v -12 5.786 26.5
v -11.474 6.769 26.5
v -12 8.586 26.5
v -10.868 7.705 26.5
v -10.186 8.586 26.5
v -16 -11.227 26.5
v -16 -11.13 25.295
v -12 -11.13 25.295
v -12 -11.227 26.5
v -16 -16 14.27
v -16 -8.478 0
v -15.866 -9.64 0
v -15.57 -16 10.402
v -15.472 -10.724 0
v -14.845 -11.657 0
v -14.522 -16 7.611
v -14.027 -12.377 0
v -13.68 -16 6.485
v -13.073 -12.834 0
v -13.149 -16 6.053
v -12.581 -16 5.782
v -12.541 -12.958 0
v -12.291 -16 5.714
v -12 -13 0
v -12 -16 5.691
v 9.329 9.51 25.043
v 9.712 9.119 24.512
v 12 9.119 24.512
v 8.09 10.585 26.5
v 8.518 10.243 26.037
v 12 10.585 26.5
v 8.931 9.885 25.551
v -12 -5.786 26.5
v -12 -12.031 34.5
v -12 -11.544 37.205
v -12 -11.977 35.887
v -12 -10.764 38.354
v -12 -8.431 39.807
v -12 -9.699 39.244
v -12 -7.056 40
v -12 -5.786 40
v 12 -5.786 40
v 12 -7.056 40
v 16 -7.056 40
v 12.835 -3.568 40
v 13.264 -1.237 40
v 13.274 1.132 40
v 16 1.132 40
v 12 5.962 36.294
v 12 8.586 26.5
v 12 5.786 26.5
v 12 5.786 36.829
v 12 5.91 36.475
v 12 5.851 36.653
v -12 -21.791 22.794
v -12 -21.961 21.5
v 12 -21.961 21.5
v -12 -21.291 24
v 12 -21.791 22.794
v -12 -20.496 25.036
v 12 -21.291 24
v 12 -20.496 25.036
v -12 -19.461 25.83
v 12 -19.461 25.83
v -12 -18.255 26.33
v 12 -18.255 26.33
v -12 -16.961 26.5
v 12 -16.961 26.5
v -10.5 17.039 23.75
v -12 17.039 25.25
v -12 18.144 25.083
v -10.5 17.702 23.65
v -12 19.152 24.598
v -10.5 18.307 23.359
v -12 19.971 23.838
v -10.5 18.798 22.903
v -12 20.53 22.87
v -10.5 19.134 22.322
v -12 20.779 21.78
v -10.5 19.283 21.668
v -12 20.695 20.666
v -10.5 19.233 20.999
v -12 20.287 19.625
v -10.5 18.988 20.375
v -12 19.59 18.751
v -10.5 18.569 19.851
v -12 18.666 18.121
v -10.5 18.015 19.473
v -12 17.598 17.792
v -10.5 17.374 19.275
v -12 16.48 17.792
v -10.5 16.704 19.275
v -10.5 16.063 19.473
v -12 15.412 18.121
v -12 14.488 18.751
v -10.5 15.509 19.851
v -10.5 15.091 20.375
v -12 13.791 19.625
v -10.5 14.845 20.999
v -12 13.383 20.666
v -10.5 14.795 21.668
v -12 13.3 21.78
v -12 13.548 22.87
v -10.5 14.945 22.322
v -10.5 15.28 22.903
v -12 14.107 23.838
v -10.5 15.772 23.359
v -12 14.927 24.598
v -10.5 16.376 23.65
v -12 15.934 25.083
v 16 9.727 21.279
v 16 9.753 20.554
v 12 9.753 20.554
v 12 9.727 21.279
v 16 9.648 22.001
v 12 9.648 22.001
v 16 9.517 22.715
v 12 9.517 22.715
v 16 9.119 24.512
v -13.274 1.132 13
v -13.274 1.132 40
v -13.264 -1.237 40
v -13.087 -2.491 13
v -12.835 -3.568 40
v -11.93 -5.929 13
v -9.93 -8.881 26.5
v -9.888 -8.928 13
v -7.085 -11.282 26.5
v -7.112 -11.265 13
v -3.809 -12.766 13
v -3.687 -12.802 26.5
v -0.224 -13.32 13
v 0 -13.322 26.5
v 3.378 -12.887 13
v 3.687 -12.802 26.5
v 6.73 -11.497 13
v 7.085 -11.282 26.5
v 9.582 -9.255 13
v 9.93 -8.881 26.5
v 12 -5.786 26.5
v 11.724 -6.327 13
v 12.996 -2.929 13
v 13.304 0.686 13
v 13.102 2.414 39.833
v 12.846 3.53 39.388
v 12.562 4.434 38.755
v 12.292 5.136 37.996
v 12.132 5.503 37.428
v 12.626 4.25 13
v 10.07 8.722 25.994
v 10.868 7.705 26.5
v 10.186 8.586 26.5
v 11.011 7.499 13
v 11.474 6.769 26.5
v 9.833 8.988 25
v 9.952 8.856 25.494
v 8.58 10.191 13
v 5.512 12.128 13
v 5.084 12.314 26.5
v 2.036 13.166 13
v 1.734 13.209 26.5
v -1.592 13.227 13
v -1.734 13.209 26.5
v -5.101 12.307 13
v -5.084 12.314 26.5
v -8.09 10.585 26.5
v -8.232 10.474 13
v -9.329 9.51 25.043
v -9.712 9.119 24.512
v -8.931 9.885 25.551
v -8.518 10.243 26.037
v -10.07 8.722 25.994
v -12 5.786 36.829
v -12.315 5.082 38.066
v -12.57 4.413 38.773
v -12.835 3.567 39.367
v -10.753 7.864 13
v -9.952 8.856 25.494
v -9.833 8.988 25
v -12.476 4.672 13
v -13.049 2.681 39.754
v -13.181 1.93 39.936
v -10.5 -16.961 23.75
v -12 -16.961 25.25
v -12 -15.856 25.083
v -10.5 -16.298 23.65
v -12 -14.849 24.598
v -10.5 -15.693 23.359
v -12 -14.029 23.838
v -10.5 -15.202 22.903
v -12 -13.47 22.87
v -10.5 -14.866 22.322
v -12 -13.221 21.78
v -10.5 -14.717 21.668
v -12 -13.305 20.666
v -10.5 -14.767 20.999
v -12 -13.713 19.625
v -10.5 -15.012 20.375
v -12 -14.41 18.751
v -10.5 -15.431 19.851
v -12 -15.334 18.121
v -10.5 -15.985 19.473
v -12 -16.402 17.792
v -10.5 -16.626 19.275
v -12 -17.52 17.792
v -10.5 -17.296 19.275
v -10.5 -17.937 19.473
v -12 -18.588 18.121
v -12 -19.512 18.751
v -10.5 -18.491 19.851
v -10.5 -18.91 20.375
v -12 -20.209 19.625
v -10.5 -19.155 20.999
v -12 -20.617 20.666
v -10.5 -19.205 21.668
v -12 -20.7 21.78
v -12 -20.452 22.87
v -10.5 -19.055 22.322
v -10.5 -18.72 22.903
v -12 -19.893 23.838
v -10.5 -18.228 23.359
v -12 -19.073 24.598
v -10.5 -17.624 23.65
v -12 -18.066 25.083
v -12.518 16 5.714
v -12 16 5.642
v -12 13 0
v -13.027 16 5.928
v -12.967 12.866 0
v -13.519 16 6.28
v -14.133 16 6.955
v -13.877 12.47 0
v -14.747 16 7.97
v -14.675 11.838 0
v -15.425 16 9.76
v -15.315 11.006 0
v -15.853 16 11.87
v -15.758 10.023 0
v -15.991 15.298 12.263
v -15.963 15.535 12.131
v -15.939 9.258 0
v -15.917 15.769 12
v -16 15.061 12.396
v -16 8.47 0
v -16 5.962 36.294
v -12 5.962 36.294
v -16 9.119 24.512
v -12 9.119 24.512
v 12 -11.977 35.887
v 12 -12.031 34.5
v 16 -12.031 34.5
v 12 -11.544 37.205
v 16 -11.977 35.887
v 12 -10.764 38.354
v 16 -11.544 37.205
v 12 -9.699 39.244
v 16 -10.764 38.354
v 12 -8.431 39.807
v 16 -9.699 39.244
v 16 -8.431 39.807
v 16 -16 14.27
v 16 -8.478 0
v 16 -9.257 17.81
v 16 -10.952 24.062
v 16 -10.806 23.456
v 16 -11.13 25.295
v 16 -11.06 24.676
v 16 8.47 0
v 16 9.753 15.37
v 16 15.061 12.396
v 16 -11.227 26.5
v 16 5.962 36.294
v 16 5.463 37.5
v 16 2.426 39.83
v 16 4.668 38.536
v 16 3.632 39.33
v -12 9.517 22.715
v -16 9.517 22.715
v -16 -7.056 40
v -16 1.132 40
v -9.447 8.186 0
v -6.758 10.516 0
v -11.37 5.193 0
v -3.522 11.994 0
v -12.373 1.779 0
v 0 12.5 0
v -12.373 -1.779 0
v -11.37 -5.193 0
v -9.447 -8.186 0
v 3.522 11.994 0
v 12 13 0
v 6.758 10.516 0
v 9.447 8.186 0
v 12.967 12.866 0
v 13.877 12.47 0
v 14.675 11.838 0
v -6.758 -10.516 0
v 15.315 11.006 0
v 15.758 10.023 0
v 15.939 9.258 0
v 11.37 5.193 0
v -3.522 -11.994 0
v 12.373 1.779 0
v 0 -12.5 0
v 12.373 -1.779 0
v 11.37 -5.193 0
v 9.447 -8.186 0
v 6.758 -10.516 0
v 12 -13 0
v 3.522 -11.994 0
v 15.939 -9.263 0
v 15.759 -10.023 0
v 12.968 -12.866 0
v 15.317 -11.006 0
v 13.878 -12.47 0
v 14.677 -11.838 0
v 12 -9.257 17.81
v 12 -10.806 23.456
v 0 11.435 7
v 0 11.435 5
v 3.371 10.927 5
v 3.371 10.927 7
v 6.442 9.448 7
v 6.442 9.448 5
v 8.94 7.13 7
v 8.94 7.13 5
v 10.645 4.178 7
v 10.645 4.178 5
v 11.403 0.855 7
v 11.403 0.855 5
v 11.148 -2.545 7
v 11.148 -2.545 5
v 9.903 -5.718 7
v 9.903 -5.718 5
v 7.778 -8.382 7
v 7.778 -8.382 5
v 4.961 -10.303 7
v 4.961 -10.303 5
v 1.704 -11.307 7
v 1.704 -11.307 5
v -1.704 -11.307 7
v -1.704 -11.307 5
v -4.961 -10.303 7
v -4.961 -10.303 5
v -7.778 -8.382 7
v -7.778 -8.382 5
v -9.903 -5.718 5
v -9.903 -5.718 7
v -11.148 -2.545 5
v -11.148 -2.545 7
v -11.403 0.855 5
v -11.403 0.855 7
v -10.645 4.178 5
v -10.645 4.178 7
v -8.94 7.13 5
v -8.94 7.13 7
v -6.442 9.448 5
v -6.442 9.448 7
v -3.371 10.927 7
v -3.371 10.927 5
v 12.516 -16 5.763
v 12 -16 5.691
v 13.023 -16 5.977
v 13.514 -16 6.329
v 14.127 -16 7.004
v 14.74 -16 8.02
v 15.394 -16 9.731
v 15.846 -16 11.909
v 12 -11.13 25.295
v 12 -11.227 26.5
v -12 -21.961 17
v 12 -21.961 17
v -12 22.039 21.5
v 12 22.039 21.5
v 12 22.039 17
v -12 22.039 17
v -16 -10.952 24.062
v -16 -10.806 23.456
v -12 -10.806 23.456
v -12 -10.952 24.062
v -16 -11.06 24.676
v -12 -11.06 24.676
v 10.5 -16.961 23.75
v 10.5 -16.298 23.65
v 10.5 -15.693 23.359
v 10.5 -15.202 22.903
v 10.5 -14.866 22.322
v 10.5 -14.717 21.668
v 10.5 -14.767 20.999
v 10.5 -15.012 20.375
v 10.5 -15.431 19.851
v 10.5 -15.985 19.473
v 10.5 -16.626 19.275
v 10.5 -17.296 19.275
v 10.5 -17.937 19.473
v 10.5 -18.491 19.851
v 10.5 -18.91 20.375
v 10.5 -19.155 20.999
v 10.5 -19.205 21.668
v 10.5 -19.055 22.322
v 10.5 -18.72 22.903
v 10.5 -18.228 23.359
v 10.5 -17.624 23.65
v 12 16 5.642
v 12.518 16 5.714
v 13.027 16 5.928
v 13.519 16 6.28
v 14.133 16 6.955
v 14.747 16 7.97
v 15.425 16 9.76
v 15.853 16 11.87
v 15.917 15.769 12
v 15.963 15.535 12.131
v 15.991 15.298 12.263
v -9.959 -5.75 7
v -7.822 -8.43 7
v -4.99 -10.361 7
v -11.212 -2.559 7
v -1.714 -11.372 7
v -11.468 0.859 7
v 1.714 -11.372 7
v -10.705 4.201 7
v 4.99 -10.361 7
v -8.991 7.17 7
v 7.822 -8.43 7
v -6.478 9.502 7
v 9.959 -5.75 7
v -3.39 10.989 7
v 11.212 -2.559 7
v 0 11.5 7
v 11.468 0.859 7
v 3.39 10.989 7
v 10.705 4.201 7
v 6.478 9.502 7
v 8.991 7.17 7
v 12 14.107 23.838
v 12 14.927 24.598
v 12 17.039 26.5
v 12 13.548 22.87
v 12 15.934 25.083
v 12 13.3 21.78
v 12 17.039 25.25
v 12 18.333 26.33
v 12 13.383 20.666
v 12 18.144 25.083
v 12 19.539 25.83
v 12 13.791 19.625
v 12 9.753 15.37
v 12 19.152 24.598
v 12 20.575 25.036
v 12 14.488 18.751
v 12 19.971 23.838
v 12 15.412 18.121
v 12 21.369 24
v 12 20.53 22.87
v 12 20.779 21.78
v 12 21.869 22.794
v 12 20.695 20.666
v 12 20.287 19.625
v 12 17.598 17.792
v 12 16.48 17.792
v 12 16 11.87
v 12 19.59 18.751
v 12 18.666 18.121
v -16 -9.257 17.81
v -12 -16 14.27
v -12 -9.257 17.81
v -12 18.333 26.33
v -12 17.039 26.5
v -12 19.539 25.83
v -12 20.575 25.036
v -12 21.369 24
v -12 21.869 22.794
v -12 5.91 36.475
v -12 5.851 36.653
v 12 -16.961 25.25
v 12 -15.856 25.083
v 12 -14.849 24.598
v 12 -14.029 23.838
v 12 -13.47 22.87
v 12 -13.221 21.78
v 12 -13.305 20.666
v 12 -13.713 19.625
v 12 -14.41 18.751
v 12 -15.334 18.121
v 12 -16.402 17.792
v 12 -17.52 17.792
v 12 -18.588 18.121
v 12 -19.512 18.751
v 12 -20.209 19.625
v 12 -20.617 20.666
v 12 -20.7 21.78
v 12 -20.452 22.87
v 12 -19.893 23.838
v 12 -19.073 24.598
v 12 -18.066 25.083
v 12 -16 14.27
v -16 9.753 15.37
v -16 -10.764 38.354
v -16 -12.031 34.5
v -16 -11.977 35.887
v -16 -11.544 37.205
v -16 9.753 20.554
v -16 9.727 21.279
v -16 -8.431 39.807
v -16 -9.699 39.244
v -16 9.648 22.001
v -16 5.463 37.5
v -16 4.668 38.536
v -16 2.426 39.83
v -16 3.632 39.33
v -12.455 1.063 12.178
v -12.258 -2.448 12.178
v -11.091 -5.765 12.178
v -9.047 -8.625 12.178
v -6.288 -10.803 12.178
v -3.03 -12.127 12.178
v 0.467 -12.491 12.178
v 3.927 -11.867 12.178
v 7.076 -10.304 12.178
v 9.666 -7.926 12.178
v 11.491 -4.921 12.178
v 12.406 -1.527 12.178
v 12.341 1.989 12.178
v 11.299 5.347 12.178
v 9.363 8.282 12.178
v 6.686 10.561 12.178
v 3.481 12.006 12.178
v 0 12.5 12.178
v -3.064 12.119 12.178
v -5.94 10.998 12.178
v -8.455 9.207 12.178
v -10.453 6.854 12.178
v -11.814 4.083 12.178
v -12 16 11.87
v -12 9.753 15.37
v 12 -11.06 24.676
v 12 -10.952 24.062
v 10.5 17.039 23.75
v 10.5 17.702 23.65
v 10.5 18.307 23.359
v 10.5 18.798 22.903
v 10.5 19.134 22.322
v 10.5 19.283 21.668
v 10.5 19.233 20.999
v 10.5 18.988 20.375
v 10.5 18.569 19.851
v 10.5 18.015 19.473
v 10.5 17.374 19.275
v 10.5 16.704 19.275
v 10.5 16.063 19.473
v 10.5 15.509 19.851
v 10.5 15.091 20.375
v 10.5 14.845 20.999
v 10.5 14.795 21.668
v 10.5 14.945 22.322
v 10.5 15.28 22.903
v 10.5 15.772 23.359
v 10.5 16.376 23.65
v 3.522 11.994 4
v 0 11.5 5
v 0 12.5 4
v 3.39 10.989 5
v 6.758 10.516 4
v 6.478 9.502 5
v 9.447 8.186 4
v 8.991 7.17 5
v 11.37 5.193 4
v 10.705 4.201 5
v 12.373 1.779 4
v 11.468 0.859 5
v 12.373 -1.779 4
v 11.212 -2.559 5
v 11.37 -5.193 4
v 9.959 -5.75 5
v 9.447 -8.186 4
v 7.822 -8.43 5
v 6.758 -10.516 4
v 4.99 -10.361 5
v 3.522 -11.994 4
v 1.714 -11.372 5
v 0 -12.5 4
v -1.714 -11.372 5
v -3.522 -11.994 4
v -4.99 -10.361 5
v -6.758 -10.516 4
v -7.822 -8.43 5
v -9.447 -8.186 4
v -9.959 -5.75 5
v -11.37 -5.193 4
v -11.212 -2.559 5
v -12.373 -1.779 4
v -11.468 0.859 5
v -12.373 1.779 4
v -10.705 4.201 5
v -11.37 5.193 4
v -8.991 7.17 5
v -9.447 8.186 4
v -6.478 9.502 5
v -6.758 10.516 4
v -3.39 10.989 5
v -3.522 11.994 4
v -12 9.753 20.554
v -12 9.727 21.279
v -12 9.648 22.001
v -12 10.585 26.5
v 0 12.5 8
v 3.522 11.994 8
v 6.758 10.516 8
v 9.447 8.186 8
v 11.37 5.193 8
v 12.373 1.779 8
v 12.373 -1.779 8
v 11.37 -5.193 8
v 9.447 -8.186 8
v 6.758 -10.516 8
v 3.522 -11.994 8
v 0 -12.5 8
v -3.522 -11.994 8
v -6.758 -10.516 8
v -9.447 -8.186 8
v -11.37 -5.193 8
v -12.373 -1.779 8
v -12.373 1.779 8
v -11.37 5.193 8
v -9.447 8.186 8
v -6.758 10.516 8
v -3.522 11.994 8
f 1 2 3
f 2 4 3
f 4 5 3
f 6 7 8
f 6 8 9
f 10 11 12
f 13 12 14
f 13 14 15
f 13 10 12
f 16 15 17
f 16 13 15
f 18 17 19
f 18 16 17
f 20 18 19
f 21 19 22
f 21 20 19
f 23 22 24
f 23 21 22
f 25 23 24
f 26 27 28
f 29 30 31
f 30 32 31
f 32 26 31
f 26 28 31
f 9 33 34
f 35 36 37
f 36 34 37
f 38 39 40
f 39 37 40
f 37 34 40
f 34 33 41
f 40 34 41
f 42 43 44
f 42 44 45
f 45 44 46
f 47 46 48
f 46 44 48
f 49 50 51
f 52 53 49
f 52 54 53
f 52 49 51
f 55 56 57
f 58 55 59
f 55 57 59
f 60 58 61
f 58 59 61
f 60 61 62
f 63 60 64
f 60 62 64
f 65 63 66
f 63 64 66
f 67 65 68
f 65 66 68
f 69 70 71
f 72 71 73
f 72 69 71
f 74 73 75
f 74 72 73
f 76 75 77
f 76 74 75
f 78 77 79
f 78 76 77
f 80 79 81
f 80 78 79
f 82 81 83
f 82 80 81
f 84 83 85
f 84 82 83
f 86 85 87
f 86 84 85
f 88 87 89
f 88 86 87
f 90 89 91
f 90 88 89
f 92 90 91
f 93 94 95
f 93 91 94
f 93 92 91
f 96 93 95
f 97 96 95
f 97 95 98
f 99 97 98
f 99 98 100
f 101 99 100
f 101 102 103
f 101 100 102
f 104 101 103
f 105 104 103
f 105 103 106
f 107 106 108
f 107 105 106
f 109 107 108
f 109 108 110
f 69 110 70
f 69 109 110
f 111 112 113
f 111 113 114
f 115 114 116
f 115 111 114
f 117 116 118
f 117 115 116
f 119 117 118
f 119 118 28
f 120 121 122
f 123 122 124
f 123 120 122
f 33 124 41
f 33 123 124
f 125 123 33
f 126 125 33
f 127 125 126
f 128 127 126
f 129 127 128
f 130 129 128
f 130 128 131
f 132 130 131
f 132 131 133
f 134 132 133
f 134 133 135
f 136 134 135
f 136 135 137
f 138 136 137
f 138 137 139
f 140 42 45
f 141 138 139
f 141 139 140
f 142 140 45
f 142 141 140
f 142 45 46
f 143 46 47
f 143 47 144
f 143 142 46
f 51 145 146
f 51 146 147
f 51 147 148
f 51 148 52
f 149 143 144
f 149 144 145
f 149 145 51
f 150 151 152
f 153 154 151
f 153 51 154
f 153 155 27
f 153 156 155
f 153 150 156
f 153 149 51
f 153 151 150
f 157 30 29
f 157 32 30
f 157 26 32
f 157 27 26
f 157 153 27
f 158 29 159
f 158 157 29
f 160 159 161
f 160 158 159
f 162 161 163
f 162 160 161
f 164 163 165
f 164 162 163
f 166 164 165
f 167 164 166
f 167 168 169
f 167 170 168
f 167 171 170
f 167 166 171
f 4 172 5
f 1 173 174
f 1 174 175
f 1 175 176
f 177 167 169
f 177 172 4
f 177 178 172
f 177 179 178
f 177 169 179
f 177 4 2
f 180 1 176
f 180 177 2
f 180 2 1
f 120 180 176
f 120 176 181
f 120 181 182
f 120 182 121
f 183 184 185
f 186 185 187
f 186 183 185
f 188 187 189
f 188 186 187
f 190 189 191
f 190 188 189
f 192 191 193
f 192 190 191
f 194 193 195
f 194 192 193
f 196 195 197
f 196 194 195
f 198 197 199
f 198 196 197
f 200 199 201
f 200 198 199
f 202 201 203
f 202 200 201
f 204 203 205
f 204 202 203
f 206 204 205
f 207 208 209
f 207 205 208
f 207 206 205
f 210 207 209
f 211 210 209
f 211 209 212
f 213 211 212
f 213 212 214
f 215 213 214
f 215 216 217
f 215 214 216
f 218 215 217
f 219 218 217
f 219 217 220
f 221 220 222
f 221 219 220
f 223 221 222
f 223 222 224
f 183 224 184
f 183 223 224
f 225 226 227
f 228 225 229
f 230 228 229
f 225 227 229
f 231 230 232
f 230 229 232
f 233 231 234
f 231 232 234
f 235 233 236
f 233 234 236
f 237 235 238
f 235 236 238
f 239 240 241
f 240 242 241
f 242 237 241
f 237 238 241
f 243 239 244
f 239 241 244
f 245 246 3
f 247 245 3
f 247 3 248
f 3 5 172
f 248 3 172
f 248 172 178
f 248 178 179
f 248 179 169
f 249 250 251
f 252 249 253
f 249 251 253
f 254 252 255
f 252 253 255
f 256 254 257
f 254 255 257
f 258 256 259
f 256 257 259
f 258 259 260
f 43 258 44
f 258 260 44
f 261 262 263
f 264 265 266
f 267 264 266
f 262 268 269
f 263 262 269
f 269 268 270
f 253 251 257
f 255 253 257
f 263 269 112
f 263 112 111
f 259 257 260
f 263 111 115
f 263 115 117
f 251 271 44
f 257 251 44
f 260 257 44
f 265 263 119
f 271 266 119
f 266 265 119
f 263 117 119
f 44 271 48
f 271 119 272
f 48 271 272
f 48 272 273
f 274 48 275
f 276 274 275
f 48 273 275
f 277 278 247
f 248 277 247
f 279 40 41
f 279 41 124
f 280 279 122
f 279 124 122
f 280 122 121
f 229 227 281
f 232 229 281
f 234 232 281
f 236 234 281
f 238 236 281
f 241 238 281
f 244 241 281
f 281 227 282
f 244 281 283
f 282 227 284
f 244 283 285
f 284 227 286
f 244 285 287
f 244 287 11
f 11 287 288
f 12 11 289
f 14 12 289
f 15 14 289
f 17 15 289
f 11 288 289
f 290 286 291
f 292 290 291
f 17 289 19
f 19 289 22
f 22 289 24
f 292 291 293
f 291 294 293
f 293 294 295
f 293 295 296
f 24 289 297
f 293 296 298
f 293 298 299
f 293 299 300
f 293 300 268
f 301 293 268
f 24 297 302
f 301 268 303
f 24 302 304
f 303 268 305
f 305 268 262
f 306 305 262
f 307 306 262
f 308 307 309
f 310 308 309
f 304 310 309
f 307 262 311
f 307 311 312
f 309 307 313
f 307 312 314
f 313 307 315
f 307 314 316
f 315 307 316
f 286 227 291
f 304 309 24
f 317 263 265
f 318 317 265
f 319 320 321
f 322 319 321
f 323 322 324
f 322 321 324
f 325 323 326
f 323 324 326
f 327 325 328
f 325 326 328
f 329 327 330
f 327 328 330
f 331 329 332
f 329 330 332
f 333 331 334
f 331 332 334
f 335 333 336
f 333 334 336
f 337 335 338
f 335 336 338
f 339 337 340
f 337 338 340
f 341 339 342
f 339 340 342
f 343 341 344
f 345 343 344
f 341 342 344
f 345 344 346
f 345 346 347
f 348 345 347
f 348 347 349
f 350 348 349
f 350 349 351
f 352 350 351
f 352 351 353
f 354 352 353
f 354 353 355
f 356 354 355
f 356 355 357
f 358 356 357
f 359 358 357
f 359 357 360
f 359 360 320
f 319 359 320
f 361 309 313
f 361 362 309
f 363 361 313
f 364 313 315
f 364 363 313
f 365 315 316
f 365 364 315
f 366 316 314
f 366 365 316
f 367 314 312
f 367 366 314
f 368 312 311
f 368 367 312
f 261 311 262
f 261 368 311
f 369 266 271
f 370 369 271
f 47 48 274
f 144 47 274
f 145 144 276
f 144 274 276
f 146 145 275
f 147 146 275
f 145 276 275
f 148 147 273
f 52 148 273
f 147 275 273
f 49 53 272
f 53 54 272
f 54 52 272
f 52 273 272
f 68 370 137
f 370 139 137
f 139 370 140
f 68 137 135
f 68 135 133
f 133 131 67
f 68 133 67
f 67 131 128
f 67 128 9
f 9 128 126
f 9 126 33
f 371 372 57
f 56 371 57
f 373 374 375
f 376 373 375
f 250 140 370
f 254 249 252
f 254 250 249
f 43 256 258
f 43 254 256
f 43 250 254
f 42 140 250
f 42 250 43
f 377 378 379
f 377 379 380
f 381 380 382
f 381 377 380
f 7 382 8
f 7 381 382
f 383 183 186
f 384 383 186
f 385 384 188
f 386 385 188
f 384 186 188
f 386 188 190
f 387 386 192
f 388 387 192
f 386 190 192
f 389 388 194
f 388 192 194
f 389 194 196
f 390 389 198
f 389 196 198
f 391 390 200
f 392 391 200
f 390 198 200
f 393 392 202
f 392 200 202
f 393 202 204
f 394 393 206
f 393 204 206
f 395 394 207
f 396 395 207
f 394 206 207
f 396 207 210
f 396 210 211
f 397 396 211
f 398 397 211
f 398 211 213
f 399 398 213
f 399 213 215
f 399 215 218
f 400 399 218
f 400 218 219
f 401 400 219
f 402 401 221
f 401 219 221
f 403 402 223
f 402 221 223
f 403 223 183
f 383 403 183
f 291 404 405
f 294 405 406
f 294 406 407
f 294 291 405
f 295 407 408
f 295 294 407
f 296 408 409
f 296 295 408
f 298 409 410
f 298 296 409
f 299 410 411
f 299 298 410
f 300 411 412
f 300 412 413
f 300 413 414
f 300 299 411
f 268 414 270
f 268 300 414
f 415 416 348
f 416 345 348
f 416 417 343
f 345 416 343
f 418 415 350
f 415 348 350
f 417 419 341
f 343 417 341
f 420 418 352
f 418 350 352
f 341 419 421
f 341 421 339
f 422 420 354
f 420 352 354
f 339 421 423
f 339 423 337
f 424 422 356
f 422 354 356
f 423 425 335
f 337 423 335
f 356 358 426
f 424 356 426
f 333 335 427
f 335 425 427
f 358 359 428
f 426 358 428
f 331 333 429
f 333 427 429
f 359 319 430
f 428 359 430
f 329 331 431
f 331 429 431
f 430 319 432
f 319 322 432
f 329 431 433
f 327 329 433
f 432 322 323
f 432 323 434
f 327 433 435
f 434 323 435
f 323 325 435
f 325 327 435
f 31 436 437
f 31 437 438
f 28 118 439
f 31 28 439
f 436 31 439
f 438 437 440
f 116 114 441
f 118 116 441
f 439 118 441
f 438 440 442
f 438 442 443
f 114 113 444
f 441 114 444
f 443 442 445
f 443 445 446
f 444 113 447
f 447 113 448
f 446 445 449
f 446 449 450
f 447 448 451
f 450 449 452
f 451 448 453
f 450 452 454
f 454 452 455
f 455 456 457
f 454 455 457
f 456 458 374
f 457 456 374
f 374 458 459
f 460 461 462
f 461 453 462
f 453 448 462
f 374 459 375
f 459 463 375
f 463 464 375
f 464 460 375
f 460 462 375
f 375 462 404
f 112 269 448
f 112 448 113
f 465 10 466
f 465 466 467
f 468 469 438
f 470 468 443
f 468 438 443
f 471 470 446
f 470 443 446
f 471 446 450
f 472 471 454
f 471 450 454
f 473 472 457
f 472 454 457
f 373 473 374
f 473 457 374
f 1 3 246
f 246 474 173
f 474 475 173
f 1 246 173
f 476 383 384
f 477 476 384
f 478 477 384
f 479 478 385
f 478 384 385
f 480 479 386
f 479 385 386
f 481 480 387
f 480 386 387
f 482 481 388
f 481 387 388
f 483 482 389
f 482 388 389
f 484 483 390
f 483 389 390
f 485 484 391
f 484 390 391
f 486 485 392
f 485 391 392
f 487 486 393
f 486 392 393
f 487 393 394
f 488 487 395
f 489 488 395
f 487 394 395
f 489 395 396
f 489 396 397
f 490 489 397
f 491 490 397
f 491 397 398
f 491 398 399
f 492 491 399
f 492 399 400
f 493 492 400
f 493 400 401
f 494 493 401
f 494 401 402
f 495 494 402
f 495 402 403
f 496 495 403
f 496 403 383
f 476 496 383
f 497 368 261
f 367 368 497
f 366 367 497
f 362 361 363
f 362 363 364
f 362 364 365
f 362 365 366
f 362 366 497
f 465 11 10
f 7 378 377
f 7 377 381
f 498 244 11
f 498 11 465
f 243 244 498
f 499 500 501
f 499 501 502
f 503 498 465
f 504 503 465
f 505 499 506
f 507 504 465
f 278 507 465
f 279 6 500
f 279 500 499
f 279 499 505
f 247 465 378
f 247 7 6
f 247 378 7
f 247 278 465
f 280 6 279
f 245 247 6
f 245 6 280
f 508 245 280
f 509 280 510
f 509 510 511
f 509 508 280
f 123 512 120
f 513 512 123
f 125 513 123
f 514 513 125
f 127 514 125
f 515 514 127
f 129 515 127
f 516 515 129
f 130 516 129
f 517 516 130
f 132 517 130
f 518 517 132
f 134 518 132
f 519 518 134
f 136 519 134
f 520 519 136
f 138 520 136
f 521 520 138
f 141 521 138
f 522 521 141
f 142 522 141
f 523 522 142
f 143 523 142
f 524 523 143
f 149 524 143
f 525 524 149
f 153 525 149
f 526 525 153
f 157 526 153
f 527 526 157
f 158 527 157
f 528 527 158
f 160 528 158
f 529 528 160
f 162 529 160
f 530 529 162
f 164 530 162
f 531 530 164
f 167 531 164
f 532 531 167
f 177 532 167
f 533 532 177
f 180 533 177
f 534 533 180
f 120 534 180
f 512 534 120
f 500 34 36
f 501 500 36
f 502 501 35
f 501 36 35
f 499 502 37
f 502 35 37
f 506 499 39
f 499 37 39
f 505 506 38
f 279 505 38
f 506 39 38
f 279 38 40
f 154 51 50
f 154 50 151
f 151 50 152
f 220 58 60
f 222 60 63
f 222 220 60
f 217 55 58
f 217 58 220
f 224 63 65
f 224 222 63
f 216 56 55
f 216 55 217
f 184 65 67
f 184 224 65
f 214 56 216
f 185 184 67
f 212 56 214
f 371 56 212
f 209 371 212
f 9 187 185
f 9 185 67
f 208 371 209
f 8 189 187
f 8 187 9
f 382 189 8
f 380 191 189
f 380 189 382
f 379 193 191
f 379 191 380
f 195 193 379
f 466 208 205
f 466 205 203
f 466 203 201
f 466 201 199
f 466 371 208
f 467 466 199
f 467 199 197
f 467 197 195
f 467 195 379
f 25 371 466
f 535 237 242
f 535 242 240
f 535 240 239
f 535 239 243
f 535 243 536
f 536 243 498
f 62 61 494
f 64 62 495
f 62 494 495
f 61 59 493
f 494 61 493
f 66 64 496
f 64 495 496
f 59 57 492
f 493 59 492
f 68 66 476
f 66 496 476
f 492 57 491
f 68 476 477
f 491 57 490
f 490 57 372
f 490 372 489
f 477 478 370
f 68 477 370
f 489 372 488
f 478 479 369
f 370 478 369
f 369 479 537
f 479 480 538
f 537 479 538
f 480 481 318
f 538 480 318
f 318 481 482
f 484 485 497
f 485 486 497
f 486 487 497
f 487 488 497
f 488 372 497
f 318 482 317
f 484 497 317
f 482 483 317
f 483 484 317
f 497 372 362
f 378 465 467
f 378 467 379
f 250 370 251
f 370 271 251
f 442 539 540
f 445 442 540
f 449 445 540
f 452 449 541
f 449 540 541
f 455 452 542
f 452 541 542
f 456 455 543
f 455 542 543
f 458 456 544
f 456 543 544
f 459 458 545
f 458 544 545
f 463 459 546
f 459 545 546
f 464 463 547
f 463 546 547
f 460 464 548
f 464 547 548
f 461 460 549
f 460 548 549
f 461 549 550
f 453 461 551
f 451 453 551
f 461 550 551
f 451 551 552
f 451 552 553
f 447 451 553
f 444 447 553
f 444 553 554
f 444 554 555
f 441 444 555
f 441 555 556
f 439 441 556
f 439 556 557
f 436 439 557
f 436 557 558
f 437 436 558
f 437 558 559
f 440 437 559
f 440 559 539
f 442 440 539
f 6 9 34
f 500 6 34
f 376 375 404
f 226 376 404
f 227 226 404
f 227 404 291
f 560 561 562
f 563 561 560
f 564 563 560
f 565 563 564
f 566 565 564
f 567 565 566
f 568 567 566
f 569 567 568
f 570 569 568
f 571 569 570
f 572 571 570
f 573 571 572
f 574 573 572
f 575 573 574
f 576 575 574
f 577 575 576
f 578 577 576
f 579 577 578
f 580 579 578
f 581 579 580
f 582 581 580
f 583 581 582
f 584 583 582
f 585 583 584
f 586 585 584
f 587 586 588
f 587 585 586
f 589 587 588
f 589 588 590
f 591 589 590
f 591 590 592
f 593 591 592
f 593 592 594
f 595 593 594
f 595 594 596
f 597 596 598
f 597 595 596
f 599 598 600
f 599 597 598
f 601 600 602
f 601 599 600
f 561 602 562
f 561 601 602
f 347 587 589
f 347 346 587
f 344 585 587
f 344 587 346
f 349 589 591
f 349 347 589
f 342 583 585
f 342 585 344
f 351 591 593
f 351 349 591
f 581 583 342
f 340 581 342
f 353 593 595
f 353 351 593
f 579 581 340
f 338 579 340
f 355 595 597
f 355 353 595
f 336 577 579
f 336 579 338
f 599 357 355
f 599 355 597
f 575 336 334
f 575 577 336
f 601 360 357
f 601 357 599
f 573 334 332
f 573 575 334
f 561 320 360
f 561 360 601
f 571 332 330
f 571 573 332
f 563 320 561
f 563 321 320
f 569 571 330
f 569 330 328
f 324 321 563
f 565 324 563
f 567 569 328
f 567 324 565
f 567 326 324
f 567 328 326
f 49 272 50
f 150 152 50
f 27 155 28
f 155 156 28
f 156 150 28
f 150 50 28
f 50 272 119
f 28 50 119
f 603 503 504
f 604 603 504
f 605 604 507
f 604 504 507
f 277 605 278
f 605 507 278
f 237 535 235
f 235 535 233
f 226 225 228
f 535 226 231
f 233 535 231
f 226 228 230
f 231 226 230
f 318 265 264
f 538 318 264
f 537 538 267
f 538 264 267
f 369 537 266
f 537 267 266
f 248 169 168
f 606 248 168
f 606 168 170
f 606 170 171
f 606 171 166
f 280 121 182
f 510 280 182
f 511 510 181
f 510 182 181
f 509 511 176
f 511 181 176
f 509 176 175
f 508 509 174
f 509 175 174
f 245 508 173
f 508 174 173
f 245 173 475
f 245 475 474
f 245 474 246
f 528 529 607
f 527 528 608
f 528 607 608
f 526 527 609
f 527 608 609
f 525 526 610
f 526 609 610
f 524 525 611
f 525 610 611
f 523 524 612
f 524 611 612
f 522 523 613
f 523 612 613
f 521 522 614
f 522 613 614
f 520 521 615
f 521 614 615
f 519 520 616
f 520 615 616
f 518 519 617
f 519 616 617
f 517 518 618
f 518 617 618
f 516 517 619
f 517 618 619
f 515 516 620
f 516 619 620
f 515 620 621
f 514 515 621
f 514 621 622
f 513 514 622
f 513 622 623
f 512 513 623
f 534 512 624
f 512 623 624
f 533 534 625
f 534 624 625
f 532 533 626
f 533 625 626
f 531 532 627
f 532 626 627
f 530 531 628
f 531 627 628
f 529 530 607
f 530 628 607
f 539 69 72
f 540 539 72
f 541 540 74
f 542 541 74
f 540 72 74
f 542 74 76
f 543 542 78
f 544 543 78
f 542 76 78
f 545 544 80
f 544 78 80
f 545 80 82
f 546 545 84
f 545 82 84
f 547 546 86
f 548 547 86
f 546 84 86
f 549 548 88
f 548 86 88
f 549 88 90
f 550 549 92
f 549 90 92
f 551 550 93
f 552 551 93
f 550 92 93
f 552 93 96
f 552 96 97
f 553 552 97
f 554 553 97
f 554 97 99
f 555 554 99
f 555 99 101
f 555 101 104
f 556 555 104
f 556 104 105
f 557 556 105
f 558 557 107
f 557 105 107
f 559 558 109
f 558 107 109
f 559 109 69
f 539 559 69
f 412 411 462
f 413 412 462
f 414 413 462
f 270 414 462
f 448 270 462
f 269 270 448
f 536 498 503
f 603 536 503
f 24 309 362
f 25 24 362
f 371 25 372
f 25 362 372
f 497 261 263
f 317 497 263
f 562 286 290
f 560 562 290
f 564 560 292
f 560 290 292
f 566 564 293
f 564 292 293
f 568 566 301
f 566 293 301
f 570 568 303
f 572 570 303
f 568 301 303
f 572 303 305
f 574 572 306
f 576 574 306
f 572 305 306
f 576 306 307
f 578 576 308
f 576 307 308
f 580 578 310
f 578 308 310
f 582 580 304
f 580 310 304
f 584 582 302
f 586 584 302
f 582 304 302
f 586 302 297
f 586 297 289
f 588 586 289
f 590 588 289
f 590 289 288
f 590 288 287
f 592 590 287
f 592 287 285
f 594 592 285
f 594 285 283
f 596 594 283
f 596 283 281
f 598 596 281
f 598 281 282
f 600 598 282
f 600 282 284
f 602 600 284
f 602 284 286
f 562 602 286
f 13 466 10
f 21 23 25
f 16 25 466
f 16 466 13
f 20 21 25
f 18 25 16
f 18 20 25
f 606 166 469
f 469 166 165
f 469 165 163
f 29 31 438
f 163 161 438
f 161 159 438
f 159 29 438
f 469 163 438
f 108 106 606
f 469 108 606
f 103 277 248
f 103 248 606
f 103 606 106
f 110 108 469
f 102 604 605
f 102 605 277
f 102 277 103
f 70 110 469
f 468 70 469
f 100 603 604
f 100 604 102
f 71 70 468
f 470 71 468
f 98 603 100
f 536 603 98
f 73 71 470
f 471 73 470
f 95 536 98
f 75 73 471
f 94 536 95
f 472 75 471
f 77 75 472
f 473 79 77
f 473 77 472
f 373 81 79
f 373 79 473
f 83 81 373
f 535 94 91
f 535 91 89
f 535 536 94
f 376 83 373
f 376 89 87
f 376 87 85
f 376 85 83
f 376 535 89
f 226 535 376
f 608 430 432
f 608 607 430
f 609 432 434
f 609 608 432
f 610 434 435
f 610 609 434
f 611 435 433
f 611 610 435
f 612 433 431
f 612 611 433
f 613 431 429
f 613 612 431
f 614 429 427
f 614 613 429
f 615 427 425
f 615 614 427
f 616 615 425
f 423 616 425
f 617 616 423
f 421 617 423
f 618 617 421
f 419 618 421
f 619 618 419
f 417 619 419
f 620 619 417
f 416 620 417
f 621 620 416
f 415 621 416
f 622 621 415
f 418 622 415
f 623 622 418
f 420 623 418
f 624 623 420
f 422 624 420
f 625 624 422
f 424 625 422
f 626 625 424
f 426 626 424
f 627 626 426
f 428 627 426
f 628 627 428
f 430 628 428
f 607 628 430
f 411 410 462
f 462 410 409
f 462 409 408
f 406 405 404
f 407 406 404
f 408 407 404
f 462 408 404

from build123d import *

# Parameters (mm, degrees)
BOSS_EXTRUDE1_DEPTH           = 16
SKETCH2_W                     = 4
SKETCH2_H                     = 6.039060338
CUT_EXTRUDE1_DEPTH            = 49.391321349
FILLET1_R                     = 4
CUT_EXTRUDE2_DEPTH            = 4
SKETCH4_R                     = 12.5
CUT_EXTRUDE3_DEPTH            = 5
SKETCH5_R                     = 11.435
CUT_EXTRUDE4_DEPTH            = 45.34771704
CUT_EXTRUDE5_START            = -2
SKETCH7_R                     = 12.5
CUT_EXTRUDE5_DEPTH            = 43.347717155
CUT_EXTRUDE6_START            = 5
SKETCH8_R                     = 13.322
CUT_EXTRUDE6_DEPTH            = 38.786914196
CHAMFER5_SIZE                 = 1
SKETCH9_W                     = 24
SKETCH9_H                     = 20
CUT_EXTRUDE7_DEPTH            = 59.111966759
CSK_FOR_M4_SFHCS1_D           = 4.5
CSK_FOR_M4_SFHCS1_CSINK_D     = 7.5
CSK_FOR_M4_SFHCS1_CSINK_ANGLE = 90


with BuildPart() as part:
    # Sketch1 → Boss-Extrude1 (new, symmetric)
    with BuildSketch(Plane(origin=(0, 0, 0), x_dir=(0, 0, -1), z_dir=(1, 0, 0))):
        with BuildLine():
            Line((0, 13), (0, -13))
            Line((0, -13), (-17, -21.960950792))
            Line((-17, -21.960950792), (-21.5, -21.960950792))
            ThreePointArc((-21.5, -21.960950792), (-25.035533906, -20.496484698), (-26.5, -16.960950792))
            Line((-26.5, -16.960950792), (-26.5, -11.227190102))
            Line((-26.5, -11.227190102), (-34.5, -12.031216319))
            ThreePointArc((-34.5, -12.031216319), (-38.354100408, -10.76437729), (-39.999997516, -7.056278884))
            Line((-39.999997516, -7.056278884), (-39.999997516, 1.132402994))
            ThreePointArc((-39.999997516, 1.132402994), (-38.966764217, 4.176210139), (-36.294092741, 5.962032125))
            Line((-36.294092741, 5.962032125), (-24.512466398, 9.118909389))
            Line((-24.512466398, 9.118909389), (-26.5, 10.584515032))
            Line((-26.5, 10.584515032), (-26.5, 17.039060338))
            ThreePointArc((-26.5, 17.039060338), (-25.035533906, 20.574594244), (-21.5, 22.039060338))
            Line((-21.5, 22.039060338), (-17, 22.039060338))
            Line((-17, 22.039060338), (0, 13))
        make_face()
    extrude(amount=BOSS_EXTRUDE1_DEPTH, both=True)

    # Sketch2 → Cut-Extrude1 (cut, through all)
    with BuildSketch(Plane(origin=(0, 0, 0), x_dir=(-1, 0, 0), z_dir=(0, 0, -1))):
        with Locations((-14, 19.019530169)):
            Rectangle(SKETCH2_W, SKETCH2_H)
        with Locations((14, 19.019530169)):
            Rectangle(SKETCH2_W, SKETCH2_H)
        with Locations((14, -19.019530169)):
            Rectangle(SKETCH2_W, SKETCH2_H)
        with Locations((-14, -19.019530169)):
            Rectangle(SKETCH2_W, SKETCH2_H)
    extrude(amount=-CUT_EXTRUDE1_DEPTH, mode=Mode.SUBTRACT)

    # Fillet1
    fillet1_edges = [part.edges().sort_by_distance(p)[0] for p in [
        (16, -14.5, 2.845680173),
        (-16, -14.5, 2.845680173),
        (16, 14.5, 2.821089698),
        (-16, 14.5, 2.821089698),
    ]]
    fillet(fillet1_edges, radius=FILLET1_R)

    # Sketch3 → Cut-Extrude2 (cut)
    with BuildSketch(Plane.ZY.offset(16)):
        with BuildLine():
            Line((14.269532395, -16), (17.810147733, -9.256580566))
            Line((17.810147733, -9.256580566), (23.455857772, -10.805790893))
            ThreePointArc((23.455857772, -10.805790893), (24.367969512, -11.010765142), (25.295236814, -11.12966687))
            Line((25.295236814, -11.12966687), (26.5, -11.227190102))
            Line((26.5, -11.227190102), (26.5, -16))
            Line((26.5, -16), (14.269532395, -16))
        make_face()
        with BuildLine():
            Line((11.870259532, 16), (15.370259532, 9.753066737))
            Line((15.370259532, 9.753066737), (20.553734624, 9.753066737))
            ThreePointArc((20.553734624, 9.753066737), (21.64061559, 9.693825703), (22.714618956, 9.516804502))
            Line((22.714618956, 9.516804502), (24.512466398, 9.118909389))
            Line((24.512466398, 9.118909389), (26.5, 10.584515032))
            Line((26.5, 10.584515032), (26.5, 16))
            Line((26.5, 16), (11.870259532, 16))
        make_face()
    cut_extrude2 = extrude(amount=-CUT_EXTRUDE2_DEPTH, mode=Mode.SUBTRACT)

    # Mirror1: Cut-Extrude2 across plane
    add(cut_extrude2.mirror(Plane(origin=(0, 0, 0), x_dir=(0, 0, 1), z_dir=(1, 0, 0))), mode=Mode.SUBTRACT)

    # Sketch4 → Cut-Extrude3 (cut)
    with BuildSketch(Plane(origin=(0, 0, 0), x_dir=(-1, 0, 0), z_dir=(0, 0, -1))):
        with Locations(Location((0, 0, 0), (0, 0, 90))):
            Circle(SKETCH4_R)
    extrude(amount=-CUT_EXTRUDE3_DEPTH, mode=Mode.SUBTRACT)

    # Sketch5 → Cut-Extrude4 (cut, through all)
    with BuildSketch(Plane(origin=(0, 0, 5), x_dir=(-1, 0, 0), z_dir=(0, 0, -1))):
        with Locations(Location((0, 0, 0), (0, 0, 90))):
            Circle(SKETCH5_R)
    extrude(amount=-CUT_EXTRUDE4_DEPTH, mode=Mode.SUBTRACT)

    # Sketch7 → Cut-Extrude5 (cut, through all)
    with BuildSketch(Plane(origin=(0, 0, 5), x_dir=(-1, 0, 0), z_dir=(0, 0, -1)).offset(CUT_EXTRUDE5_START)):
        with Locations(Location((0, 0, 0), (0, 0, 90))):
            Circle(SKETCH7_R)
    extrude(amount=-CUT_EXTRUDE5_DEPTH, mode=Mode.SUBTRACT)

    # Sketch8 → Cut-Extrude6 (cut, through all)
    with BuildSketch(Plane.XY.offset(7).offset(CUT_EXTRUDE6_START)):
        with Locations(Location((0, 0, 0), (0, 0, 175.123832714))):
            Circle(SKETCH8_R)
    extrude(amount=CUT_EXTRUDE6_DEPTH, mode=Mode.SUBTRACT)

    # Chamfer5
    # the kernel refuses this chamfer: 1 mm, written as the material it adds along each edge
    with BuildSketch(Plane(origin=(0, 0, 7), x_dir=(0, 1, 0), z_dir=(-1, 0, 0))) as chamfer5_piece_1:
        Polygon((12.5 - CHAMFER5_SIZE, 0), (12.5, -CHAMFER5_SIZE), (12.5, 0), align=None)
    revolve(axis=Axis((0, 0, 7), (0, 0, -1)))
    with BuildSketch(Plane(origin=(0, 0, 5), x_dir=(0, 1, 0), z_dir=(-1, 0, 0))) as chamfer5_piece_2:
        Polygon((12.5, CHAMFER5_SIZE), (12.5 - CHAMFER5_SIZE, 0), (12.5, 0), align=None)
    revolve(axis=Axis((0, 0, 5), (0, 0, -1)))
    with BuildSketch(Plane(origin=(0, 0, 12), x_dir=(-0.9963807399610061, 0.08500247663896625, 0), z_dir=(0.08500247663896625, 0.9963807399610061, 0))) as chamfer5_piece_3_section:
        Polygon((13.322, CHAMFER5_SIZE), (13.322 - CHAMFER5_SIZE, 0), (13.322, 0), align=None)
    chamfer5_piece_3 = revolve(axis=Axis((0, 0, 12), (0, 0, 1)), mode=Mode.PRIVATE)
    chamfer5_piece_3 = chamfer5_piece_3 - Plane(origin=(0, 0, 12.578358266), x_dir=(0, 1, 0), z_dir=(0, 0, -1)) * Cylinder(12.5, 54, mode=Mode.PRIVATE)
    add(chamfer5_piece_3)

    # Sketch9 → Cut-Extrude7 (cut, through all)
    with BuildSketch(Plane(origin=(0, 17.039060338, 0), x_dir=(-1, 0, 0), z_dir=(0, 1, 0))):
        with Locations((0, 36.5)):
            Rectangle(SKETCH9_W, SKETCH9_H)
    extrude(amount=-CUT_EXTRUDE7_DEPTH, mode=Mode.SUBTRACT)

    # CSK for M4 SFHCS1 (through all)
    with Locations(Plane(origin=(12, 0, 0), x_dir=(0, 0, -1), z_dir=(1, 0, 0))):
        with Locations((-21.5, 17.039060338), (-21.5, -16.960950792)):
            csk_for_m4_sfhcs1 = CounterSinkHole(CSK_FOR_M4_SFHCS1_D / 2, CSK_FOR_M4_SFHCS1_CSINK_D / 2, counter_sink_angle=CSK_FOR_M4_SFHCS1_CSINK_ANGLE)

    # Mirror2: CSK for M4 SFHCS1 across plane
    add(csk_for_m4_sfhcs1.mirror(Plane(origin=(0, 0, 0), x_dir=(0, 0, 1), z_dir=(1, 0, 0))), mode=Mode.SUBTRACT)


solid = part.part
